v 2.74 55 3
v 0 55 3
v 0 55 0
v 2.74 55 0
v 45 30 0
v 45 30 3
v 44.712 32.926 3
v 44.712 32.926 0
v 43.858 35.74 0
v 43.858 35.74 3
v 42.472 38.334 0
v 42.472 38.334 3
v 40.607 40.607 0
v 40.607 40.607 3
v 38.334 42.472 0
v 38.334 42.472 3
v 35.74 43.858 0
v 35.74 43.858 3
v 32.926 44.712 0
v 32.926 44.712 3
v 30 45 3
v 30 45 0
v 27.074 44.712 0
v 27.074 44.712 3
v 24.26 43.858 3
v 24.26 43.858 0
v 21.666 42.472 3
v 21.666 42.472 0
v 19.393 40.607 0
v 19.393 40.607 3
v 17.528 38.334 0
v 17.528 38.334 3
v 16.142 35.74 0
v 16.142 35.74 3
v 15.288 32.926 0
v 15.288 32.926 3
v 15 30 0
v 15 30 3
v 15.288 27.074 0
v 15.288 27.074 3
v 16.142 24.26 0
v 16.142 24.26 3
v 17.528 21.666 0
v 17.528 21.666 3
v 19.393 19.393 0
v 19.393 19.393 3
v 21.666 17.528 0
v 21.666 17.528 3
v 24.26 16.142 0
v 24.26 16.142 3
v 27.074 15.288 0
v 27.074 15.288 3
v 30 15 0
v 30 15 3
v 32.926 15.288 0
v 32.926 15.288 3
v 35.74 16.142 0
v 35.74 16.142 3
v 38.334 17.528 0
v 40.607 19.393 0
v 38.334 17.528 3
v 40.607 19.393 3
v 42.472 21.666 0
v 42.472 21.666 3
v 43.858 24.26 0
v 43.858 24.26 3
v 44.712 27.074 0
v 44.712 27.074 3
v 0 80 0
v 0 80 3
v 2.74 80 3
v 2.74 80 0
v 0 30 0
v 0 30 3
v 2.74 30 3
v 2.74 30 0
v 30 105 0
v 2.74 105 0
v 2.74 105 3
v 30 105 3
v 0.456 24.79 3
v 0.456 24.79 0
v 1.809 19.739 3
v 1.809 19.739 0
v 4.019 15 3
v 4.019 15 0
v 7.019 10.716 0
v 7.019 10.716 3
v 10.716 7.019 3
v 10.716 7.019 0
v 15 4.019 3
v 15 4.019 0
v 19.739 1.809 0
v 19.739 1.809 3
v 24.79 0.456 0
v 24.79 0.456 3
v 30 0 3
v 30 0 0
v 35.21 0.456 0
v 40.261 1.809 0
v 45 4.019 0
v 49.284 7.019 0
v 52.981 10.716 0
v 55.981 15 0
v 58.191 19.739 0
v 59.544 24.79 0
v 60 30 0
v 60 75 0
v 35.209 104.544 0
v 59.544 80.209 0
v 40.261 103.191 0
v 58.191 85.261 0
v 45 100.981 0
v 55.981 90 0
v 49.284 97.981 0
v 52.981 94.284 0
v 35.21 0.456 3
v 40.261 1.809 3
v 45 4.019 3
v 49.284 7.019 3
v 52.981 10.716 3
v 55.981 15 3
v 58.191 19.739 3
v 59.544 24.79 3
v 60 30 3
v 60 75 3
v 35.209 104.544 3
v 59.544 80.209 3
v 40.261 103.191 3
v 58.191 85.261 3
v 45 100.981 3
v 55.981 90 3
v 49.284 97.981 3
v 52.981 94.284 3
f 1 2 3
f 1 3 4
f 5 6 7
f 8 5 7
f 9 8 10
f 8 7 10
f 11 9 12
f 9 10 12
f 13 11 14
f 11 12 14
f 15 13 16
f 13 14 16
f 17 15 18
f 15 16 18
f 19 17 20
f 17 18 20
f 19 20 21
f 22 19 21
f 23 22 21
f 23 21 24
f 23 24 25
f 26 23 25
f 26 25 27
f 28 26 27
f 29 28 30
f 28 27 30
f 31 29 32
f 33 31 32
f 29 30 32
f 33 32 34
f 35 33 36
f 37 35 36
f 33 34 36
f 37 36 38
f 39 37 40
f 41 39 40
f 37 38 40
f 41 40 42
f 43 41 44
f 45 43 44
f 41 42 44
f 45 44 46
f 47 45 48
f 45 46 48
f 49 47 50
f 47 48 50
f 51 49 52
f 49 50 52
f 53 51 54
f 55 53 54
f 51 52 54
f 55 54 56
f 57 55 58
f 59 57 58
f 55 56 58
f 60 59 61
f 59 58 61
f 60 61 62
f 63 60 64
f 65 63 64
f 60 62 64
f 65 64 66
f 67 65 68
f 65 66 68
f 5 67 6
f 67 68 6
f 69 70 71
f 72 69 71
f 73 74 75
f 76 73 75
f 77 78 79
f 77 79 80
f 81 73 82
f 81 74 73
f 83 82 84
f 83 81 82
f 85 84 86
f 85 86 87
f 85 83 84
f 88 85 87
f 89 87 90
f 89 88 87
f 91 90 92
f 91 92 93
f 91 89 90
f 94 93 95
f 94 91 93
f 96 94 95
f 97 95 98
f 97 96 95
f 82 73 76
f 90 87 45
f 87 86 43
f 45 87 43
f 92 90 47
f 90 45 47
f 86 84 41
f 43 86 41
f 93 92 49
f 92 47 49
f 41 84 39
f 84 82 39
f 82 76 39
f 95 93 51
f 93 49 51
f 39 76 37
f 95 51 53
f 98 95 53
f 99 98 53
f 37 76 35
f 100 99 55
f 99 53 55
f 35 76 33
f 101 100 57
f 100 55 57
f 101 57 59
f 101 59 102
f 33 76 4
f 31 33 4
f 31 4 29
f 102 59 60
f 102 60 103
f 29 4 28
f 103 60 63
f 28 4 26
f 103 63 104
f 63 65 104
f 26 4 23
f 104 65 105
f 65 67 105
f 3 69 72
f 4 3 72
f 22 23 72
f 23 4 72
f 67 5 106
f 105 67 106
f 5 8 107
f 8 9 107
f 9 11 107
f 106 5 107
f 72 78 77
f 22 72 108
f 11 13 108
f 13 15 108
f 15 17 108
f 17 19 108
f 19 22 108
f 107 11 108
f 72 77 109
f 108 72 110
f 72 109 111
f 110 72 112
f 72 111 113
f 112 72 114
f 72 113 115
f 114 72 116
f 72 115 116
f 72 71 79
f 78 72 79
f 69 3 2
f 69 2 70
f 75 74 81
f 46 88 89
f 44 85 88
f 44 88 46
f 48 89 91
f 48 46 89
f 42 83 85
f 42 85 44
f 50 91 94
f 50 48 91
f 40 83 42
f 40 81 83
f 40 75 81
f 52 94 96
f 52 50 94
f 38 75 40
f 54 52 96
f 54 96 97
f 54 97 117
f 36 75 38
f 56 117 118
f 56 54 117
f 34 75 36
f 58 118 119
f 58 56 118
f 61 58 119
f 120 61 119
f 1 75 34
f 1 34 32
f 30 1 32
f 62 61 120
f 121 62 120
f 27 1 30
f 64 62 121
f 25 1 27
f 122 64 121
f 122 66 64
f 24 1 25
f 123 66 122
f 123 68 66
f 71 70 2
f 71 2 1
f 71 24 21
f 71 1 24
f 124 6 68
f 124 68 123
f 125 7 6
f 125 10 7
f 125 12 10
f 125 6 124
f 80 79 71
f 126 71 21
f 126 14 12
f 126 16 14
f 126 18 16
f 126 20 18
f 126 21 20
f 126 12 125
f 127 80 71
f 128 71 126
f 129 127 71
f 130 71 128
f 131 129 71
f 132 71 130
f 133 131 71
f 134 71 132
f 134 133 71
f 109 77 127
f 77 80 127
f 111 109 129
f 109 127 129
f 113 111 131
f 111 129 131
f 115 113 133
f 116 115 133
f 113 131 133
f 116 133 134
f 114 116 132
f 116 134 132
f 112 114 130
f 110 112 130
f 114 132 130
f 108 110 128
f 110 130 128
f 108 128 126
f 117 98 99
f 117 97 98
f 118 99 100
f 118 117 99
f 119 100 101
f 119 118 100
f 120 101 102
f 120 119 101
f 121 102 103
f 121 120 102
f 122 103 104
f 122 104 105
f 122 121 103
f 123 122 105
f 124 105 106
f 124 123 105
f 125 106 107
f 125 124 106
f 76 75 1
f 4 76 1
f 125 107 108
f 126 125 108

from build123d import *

# Parameters (mm, degrees)
ESQUISSE1_W             = 60
ESQUISSE1_H             = 105
BOSS_EXTRU_1_DEPTH      = 3
CONG_1_R                = 30
ESQUISSE2_R             = 15
ENL_V_MAT_EXTRU_1_DEPTH = 3
ESQUISSE3_W             = 2.740256741
ESQUISSE3_H             = 25
ENL_V_MAT_EXTRU_2_DEPTH = 3
CONG_2_R                = 30


with BuildPart() as part:
    # Esquisse1 → Boss.-Extru.1 (new body)
    with BuildSketch(Plane.XY):
        with Locations((30, 52.5)):
            Rectangle(ESQUISSE1_W, ESQUISSE1_H)
    extrude(amount=BOSS_EXTRU_1_DEPTH)

    # Congé1
    cong_1_edges = [part.edges().sort_by_distance(p)[0] for p in [
        (60, 0, 1.5),
        (0, 0, 1.5),
    ]]
    fillet(cong_1_edges, radius=CONG_1_R - 0.0001)  # a hair under: the kernel refuses the full size

    # Esquisse2 → Enlèv. mat.-Extru.1 (cut)
    with BuildSketch(Plane.XY.offset(3)):
        with Locations((30, 30)):
            Circle(ESQUISSE2_R)
    extrude(amount=-ENL_V_MAT_EXTRU_1_DEPTH, mode=Mode.SUBTRACT)

    # Esquisse3 → Enlèv. mat.-Extru.2 (cut)
    with BuildSketch(Plane.XY.offset(3)):
        with Locations((1.370128371, 42.5)):
            Rectangle(ESQUISSE3_W, ESQUISSE3_H)
        with Locations((1.370128371, 92.5)):
            Rectangle(ESQUISSE3_W, ESQUISSE3_H)
    extrude(amount=-ENL_V_MAT_EXTRU_2_DEPTH, mode=Mode.SUBTRACT)

    # Congé2
    cong_2_edges = [part.edges().sort_by_distance(p)[0] for p in [
        (60, 105, 1.5),
    ]]
    fillet(cong_2_edges, radius=CONG_2_R)


solid = part.part
